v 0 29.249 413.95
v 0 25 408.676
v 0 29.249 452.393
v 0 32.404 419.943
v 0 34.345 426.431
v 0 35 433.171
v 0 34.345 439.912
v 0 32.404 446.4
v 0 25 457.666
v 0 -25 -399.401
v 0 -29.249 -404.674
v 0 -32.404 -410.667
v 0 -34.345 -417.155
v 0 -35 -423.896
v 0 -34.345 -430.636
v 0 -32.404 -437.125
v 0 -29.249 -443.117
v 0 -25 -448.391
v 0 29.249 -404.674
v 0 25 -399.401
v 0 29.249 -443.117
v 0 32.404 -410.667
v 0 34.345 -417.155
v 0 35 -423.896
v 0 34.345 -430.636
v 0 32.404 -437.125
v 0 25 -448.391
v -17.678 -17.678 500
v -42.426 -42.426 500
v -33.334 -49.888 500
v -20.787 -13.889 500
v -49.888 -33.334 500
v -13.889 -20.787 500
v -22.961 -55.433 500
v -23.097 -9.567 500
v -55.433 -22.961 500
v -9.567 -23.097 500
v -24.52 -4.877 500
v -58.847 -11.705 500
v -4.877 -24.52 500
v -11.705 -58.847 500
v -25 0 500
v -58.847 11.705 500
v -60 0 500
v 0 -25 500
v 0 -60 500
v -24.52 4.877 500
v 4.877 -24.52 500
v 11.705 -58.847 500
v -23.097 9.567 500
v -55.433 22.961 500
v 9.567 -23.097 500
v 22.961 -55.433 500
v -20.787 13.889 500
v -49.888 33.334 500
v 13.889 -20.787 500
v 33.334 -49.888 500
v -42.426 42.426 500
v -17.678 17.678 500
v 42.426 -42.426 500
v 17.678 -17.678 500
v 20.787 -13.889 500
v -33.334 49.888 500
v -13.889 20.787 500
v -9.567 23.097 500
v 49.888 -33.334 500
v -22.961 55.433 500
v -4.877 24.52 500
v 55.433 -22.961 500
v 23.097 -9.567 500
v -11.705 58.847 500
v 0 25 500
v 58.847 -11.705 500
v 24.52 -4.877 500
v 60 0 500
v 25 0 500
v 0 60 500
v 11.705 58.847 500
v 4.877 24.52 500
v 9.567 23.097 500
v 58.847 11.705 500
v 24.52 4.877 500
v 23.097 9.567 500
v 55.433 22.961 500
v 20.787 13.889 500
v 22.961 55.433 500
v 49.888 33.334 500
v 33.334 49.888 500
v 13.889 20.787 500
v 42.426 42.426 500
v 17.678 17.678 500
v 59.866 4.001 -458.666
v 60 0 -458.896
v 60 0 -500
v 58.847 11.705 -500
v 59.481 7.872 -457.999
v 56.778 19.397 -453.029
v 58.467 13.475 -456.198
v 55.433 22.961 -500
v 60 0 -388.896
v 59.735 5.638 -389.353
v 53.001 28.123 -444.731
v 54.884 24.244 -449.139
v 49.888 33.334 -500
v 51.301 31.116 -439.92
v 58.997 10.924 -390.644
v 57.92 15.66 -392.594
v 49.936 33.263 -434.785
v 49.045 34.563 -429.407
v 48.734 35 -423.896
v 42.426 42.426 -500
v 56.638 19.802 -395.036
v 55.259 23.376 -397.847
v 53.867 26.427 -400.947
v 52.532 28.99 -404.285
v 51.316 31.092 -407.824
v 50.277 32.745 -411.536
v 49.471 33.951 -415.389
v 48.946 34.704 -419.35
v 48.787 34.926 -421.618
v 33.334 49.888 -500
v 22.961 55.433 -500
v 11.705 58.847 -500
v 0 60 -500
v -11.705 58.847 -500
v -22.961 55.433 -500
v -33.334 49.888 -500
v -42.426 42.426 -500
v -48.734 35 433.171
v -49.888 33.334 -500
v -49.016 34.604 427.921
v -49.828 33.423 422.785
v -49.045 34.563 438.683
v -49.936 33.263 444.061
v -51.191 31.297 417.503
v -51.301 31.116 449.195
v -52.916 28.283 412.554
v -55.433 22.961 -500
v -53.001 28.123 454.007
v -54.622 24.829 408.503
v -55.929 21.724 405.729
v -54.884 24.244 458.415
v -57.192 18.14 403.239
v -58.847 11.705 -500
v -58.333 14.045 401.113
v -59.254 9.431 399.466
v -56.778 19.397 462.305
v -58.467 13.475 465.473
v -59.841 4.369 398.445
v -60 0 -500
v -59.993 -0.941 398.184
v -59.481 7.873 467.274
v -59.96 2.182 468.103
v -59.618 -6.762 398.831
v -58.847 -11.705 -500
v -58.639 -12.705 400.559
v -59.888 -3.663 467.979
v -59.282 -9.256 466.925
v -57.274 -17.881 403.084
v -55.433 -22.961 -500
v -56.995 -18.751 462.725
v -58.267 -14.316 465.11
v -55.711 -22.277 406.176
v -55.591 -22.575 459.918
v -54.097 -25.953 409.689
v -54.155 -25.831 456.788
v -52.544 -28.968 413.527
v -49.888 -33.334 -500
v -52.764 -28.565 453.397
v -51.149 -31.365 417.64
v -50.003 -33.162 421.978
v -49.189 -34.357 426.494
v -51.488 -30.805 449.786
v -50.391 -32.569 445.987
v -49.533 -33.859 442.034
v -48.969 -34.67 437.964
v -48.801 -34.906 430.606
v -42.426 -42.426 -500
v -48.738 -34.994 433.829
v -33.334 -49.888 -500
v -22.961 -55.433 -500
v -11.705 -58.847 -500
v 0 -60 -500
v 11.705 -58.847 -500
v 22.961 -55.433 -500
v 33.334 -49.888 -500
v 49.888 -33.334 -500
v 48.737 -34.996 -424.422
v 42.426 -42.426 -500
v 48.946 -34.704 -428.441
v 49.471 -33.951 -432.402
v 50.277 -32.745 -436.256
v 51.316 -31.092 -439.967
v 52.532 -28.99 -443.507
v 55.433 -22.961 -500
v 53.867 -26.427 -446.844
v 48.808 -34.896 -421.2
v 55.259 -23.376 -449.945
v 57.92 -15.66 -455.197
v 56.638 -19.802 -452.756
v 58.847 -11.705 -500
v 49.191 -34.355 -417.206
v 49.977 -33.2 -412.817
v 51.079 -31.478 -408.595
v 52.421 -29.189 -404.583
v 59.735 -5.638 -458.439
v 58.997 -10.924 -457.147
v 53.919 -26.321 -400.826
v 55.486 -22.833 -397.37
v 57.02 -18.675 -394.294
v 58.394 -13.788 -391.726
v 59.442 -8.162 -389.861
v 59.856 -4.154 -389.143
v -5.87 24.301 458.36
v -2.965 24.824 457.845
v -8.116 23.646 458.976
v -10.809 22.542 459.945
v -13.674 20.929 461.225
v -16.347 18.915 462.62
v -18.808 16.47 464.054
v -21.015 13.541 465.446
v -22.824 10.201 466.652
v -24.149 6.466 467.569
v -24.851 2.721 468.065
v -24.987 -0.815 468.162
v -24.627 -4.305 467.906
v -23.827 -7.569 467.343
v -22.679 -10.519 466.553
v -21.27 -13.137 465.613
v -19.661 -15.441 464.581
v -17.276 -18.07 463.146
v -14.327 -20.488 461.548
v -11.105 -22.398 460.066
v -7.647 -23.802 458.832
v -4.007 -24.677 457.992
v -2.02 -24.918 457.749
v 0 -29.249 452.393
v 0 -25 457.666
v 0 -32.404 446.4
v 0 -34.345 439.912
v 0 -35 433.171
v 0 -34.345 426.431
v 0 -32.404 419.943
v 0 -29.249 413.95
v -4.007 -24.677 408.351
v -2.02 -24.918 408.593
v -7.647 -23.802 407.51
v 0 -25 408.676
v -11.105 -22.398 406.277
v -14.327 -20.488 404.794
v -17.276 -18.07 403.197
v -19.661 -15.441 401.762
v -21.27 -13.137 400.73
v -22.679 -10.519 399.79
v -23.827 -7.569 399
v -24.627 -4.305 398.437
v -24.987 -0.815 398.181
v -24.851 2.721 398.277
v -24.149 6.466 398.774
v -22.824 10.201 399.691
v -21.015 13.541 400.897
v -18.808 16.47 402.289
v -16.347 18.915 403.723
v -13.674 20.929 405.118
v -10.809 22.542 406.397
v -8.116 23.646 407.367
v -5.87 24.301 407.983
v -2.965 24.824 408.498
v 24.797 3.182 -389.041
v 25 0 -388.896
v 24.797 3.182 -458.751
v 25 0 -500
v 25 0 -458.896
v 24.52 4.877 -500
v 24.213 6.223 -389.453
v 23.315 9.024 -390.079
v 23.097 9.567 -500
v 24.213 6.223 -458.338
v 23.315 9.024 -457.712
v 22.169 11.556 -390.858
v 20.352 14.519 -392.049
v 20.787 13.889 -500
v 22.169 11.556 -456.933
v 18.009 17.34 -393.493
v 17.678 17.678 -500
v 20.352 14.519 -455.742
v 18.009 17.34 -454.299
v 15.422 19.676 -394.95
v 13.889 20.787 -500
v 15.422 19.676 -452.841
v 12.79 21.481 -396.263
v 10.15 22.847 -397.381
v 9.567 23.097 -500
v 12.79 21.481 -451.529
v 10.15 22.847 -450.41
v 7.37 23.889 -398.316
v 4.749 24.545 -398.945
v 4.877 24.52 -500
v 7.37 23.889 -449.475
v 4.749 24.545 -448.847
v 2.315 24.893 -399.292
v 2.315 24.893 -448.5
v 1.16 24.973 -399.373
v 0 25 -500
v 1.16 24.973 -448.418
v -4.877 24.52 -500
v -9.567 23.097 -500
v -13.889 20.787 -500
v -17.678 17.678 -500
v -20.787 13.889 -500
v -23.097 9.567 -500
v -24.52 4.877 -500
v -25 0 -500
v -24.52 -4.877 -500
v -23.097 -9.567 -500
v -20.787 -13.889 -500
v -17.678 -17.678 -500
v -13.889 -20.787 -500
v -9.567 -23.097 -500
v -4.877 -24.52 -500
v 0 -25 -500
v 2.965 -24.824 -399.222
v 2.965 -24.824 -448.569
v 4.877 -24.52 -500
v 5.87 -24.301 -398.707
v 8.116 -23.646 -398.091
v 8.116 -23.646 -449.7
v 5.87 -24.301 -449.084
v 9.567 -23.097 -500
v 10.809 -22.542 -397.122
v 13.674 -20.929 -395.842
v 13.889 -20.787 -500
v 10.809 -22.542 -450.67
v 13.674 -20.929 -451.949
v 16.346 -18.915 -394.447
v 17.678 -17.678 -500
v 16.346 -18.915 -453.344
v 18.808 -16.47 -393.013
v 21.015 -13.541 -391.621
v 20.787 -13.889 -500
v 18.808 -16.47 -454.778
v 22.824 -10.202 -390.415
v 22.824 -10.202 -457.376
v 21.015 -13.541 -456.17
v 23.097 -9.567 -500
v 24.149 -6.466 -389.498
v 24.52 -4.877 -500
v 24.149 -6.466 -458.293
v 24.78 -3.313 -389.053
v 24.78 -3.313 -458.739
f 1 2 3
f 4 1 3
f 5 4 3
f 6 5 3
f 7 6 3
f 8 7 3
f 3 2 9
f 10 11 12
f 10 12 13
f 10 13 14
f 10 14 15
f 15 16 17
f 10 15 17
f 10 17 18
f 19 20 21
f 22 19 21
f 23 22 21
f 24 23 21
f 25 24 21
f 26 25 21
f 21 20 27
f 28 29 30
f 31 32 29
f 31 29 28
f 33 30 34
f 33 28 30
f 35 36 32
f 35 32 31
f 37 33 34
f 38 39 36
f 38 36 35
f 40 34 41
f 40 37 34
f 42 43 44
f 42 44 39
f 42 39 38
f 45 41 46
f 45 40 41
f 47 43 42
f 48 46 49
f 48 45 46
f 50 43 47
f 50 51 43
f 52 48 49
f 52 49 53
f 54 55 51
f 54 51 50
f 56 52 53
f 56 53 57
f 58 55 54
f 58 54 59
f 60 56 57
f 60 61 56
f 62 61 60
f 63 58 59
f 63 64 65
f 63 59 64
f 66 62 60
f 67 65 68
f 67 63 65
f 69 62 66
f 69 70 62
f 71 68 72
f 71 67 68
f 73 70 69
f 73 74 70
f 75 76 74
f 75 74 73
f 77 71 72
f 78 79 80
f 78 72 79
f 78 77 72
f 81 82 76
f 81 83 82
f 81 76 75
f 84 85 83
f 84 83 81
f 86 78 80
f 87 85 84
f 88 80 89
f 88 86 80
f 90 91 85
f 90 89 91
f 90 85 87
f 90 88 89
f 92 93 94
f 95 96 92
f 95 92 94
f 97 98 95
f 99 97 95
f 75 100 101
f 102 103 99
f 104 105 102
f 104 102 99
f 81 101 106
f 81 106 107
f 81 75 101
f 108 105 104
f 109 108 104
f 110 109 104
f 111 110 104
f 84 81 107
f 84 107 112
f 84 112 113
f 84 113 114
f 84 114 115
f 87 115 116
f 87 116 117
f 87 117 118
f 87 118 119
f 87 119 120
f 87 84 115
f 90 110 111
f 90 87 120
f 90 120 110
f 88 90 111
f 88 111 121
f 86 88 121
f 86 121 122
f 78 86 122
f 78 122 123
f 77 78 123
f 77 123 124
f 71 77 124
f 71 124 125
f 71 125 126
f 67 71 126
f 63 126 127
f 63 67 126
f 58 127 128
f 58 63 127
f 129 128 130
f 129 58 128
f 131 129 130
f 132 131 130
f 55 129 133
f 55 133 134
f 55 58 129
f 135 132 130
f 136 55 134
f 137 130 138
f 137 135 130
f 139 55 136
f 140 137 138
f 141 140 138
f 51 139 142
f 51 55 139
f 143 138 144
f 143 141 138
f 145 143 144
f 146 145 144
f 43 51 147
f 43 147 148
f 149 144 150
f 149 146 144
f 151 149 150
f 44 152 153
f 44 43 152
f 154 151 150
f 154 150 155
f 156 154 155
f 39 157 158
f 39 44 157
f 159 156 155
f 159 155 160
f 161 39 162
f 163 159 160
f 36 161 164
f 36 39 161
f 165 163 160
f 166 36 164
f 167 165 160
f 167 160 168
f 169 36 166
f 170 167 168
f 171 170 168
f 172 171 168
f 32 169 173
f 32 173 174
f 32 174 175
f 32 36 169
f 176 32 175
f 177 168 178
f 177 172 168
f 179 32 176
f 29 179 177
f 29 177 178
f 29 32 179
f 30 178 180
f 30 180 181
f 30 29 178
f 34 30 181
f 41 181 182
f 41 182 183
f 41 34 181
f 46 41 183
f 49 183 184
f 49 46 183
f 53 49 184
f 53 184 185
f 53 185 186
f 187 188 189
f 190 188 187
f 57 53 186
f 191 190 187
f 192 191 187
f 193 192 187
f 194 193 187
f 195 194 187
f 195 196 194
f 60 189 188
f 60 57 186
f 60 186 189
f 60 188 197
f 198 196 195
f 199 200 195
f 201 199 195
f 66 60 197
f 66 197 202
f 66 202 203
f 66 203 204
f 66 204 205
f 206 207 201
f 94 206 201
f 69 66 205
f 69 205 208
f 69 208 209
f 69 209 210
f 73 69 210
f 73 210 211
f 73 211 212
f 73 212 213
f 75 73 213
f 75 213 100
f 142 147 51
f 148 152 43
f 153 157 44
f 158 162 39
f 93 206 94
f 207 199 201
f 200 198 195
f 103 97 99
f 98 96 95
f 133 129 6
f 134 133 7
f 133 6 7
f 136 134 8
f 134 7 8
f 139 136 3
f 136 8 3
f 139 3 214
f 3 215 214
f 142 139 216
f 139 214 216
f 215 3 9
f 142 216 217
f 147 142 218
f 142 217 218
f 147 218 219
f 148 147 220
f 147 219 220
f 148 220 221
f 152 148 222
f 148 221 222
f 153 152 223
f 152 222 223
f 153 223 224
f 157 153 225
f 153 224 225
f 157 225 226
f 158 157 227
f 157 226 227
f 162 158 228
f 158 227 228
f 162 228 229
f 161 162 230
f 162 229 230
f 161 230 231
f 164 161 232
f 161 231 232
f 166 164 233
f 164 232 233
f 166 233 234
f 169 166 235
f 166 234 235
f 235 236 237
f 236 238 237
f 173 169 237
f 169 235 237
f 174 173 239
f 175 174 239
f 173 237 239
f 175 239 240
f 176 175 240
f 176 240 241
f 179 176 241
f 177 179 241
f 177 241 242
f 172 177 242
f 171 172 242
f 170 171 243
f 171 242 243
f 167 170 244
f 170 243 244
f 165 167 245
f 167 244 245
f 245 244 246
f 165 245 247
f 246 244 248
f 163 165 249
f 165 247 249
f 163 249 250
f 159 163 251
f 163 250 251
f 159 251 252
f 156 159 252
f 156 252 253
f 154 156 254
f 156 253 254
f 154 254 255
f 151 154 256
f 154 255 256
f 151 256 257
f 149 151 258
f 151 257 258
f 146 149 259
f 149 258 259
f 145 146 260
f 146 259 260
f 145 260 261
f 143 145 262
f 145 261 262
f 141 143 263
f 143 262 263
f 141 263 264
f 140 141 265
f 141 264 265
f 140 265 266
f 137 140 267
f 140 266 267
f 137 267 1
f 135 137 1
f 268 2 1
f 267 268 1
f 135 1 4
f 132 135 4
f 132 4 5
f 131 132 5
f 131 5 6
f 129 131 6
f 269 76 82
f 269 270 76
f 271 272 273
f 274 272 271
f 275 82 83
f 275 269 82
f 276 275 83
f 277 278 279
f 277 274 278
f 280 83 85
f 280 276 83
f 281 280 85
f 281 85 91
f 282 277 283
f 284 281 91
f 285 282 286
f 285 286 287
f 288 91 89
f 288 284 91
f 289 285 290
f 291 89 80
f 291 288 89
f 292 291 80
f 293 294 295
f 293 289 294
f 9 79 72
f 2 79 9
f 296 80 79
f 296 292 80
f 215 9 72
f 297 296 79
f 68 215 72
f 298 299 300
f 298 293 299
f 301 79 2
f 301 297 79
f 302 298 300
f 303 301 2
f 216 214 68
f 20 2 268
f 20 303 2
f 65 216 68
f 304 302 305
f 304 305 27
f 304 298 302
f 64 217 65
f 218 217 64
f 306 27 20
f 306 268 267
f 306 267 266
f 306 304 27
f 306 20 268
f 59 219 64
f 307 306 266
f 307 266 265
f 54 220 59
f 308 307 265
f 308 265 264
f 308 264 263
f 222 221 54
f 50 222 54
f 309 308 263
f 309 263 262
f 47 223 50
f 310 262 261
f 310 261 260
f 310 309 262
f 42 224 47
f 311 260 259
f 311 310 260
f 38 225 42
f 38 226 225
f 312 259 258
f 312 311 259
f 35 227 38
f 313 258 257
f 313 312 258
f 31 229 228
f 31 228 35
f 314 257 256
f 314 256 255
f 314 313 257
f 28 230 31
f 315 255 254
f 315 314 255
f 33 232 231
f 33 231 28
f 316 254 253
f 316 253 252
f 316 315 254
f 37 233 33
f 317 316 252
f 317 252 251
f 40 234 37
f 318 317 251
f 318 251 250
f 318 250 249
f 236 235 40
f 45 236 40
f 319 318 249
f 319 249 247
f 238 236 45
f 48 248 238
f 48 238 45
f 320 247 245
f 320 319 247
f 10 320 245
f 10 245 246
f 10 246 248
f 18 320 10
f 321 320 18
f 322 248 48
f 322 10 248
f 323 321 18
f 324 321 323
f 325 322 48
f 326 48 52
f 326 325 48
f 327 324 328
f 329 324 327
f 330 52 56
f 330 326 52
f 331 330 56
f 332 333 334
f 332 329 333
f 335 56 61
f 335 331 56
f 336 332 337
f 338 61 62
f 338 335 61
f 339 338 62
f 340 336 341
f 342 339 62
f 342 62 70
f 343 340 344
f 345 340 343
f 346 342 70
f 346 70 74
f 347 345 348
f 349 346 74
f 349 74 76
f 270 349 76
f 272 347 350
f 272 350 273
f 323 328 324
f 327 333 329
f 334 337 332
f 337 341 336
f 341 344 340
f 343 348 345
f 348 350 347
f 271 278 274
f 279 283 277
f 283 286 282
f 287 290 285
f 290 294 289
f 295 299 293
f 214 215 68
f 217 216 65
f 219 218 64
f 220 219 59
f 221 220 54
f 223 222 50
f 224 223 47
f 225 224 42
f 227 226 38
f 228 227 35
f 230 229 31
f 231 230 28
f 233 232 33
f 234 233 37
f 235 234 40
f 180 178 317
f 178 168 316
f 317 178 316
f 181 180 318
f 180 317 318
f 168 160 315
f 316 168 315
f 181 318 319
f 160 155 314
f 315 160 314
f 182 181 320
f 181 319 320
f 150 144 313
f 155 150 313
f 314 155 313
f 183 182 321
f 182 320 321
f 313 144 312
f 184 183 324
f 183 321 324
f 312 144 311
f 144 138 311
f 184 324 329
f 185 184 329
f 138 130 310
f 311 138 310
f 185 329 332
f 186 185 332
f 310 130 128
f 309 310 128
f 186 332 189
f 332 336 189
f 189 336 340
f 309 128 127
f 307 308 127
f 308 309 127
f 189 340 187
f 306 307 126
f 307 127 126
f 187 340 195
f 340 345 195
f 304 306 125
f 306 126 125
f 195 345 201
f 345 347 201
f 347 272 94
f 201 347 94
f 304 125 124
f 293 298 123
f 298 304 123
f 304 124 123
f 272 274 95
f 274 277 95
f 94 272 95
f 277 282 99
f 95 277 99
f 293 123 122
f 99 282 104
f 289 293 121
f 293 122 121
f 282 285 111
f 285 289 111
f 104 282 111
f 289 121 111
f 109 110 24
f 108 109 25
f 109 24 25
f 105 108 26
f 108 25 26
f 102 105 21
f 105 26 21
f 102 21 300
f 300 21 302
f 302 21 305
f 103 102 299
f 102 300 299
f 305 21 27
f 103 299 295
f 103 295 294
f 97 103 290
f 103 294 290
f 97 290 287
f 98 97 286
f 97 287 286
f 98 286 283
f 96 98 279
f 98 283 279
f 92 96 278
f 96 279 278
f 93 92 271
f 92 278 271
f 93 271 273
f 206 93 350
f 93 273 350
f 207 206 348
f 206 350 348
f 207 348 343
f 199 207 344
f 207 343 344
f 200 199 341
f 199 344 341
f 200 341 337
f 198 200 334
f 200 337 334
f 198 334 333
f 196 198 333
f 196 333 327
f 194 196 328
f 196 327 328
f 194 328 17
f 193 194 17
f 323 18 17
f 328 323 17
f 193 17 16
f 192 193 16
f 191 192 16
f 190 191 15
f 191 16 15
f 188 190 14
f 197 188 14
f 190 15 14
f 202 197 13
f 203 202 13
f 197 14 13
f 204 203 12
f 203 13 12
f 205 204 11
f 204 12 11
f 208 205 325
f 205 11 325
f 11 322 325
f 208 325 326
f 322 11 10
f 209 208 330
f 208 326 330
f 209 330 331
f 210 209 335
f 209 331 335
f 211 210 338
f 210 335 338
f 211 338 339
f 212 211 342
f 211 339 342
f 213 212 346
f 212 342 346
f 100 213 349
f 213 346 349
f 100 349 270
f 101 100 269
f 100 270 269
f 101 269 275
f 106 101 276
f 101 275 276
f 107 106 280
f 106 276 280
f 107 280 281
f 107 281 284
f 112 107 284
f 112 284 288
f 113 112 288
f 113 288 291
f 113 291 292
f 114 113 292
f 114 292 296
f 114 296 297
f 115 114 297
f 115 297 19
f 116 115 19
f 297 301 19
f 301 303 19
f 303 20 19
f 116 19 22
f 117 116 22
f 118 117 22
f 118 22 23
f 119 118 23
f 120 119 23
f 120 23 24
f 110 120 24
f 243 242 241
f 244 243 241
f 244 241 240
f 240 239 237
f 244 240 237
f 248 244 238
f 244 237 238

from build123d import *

# Parameters (mm, degrees)
F0_R     = 60
F0_R_2   = 25
F1_DEPTH = 500
F3_D     = 70
F3_DEPTH = 60.001
F5_D     = 70
F5_DEPTH = 60.0010001


with BuildPart() as f1:
    # F0 (on Top) → F1 (new body, symmetric)
    with BuildSketch(Plane.XY):
        Circle(F0_R)
        Circle(F0_R_2, mode=Mode.SUBTRACT)
    extrude(amount=F1_DEPTH, both=True)

    # F3 (through all, one way)
    with BuildSketch(Plane.YZ):
        with Locations((0, 433.1713616848)):
            Circle(F3_D / 2)
    extrude(amount=-F3_DEPTH, mode=Mode.SUBTRACT)

    # F5 (through all, one way)
    with BuildSketch(Plane(origin=(0, 0, 0), x_dir=(0, 1, 0), z_dir=(-1, 0, 0))):
        with Locations((0, 423.8957464695)):
            Circle(F5_D / 2)
    extrude(amount=-F5_DEPTH, mode=Mode.SUBTRACT)


solid = f1.part
